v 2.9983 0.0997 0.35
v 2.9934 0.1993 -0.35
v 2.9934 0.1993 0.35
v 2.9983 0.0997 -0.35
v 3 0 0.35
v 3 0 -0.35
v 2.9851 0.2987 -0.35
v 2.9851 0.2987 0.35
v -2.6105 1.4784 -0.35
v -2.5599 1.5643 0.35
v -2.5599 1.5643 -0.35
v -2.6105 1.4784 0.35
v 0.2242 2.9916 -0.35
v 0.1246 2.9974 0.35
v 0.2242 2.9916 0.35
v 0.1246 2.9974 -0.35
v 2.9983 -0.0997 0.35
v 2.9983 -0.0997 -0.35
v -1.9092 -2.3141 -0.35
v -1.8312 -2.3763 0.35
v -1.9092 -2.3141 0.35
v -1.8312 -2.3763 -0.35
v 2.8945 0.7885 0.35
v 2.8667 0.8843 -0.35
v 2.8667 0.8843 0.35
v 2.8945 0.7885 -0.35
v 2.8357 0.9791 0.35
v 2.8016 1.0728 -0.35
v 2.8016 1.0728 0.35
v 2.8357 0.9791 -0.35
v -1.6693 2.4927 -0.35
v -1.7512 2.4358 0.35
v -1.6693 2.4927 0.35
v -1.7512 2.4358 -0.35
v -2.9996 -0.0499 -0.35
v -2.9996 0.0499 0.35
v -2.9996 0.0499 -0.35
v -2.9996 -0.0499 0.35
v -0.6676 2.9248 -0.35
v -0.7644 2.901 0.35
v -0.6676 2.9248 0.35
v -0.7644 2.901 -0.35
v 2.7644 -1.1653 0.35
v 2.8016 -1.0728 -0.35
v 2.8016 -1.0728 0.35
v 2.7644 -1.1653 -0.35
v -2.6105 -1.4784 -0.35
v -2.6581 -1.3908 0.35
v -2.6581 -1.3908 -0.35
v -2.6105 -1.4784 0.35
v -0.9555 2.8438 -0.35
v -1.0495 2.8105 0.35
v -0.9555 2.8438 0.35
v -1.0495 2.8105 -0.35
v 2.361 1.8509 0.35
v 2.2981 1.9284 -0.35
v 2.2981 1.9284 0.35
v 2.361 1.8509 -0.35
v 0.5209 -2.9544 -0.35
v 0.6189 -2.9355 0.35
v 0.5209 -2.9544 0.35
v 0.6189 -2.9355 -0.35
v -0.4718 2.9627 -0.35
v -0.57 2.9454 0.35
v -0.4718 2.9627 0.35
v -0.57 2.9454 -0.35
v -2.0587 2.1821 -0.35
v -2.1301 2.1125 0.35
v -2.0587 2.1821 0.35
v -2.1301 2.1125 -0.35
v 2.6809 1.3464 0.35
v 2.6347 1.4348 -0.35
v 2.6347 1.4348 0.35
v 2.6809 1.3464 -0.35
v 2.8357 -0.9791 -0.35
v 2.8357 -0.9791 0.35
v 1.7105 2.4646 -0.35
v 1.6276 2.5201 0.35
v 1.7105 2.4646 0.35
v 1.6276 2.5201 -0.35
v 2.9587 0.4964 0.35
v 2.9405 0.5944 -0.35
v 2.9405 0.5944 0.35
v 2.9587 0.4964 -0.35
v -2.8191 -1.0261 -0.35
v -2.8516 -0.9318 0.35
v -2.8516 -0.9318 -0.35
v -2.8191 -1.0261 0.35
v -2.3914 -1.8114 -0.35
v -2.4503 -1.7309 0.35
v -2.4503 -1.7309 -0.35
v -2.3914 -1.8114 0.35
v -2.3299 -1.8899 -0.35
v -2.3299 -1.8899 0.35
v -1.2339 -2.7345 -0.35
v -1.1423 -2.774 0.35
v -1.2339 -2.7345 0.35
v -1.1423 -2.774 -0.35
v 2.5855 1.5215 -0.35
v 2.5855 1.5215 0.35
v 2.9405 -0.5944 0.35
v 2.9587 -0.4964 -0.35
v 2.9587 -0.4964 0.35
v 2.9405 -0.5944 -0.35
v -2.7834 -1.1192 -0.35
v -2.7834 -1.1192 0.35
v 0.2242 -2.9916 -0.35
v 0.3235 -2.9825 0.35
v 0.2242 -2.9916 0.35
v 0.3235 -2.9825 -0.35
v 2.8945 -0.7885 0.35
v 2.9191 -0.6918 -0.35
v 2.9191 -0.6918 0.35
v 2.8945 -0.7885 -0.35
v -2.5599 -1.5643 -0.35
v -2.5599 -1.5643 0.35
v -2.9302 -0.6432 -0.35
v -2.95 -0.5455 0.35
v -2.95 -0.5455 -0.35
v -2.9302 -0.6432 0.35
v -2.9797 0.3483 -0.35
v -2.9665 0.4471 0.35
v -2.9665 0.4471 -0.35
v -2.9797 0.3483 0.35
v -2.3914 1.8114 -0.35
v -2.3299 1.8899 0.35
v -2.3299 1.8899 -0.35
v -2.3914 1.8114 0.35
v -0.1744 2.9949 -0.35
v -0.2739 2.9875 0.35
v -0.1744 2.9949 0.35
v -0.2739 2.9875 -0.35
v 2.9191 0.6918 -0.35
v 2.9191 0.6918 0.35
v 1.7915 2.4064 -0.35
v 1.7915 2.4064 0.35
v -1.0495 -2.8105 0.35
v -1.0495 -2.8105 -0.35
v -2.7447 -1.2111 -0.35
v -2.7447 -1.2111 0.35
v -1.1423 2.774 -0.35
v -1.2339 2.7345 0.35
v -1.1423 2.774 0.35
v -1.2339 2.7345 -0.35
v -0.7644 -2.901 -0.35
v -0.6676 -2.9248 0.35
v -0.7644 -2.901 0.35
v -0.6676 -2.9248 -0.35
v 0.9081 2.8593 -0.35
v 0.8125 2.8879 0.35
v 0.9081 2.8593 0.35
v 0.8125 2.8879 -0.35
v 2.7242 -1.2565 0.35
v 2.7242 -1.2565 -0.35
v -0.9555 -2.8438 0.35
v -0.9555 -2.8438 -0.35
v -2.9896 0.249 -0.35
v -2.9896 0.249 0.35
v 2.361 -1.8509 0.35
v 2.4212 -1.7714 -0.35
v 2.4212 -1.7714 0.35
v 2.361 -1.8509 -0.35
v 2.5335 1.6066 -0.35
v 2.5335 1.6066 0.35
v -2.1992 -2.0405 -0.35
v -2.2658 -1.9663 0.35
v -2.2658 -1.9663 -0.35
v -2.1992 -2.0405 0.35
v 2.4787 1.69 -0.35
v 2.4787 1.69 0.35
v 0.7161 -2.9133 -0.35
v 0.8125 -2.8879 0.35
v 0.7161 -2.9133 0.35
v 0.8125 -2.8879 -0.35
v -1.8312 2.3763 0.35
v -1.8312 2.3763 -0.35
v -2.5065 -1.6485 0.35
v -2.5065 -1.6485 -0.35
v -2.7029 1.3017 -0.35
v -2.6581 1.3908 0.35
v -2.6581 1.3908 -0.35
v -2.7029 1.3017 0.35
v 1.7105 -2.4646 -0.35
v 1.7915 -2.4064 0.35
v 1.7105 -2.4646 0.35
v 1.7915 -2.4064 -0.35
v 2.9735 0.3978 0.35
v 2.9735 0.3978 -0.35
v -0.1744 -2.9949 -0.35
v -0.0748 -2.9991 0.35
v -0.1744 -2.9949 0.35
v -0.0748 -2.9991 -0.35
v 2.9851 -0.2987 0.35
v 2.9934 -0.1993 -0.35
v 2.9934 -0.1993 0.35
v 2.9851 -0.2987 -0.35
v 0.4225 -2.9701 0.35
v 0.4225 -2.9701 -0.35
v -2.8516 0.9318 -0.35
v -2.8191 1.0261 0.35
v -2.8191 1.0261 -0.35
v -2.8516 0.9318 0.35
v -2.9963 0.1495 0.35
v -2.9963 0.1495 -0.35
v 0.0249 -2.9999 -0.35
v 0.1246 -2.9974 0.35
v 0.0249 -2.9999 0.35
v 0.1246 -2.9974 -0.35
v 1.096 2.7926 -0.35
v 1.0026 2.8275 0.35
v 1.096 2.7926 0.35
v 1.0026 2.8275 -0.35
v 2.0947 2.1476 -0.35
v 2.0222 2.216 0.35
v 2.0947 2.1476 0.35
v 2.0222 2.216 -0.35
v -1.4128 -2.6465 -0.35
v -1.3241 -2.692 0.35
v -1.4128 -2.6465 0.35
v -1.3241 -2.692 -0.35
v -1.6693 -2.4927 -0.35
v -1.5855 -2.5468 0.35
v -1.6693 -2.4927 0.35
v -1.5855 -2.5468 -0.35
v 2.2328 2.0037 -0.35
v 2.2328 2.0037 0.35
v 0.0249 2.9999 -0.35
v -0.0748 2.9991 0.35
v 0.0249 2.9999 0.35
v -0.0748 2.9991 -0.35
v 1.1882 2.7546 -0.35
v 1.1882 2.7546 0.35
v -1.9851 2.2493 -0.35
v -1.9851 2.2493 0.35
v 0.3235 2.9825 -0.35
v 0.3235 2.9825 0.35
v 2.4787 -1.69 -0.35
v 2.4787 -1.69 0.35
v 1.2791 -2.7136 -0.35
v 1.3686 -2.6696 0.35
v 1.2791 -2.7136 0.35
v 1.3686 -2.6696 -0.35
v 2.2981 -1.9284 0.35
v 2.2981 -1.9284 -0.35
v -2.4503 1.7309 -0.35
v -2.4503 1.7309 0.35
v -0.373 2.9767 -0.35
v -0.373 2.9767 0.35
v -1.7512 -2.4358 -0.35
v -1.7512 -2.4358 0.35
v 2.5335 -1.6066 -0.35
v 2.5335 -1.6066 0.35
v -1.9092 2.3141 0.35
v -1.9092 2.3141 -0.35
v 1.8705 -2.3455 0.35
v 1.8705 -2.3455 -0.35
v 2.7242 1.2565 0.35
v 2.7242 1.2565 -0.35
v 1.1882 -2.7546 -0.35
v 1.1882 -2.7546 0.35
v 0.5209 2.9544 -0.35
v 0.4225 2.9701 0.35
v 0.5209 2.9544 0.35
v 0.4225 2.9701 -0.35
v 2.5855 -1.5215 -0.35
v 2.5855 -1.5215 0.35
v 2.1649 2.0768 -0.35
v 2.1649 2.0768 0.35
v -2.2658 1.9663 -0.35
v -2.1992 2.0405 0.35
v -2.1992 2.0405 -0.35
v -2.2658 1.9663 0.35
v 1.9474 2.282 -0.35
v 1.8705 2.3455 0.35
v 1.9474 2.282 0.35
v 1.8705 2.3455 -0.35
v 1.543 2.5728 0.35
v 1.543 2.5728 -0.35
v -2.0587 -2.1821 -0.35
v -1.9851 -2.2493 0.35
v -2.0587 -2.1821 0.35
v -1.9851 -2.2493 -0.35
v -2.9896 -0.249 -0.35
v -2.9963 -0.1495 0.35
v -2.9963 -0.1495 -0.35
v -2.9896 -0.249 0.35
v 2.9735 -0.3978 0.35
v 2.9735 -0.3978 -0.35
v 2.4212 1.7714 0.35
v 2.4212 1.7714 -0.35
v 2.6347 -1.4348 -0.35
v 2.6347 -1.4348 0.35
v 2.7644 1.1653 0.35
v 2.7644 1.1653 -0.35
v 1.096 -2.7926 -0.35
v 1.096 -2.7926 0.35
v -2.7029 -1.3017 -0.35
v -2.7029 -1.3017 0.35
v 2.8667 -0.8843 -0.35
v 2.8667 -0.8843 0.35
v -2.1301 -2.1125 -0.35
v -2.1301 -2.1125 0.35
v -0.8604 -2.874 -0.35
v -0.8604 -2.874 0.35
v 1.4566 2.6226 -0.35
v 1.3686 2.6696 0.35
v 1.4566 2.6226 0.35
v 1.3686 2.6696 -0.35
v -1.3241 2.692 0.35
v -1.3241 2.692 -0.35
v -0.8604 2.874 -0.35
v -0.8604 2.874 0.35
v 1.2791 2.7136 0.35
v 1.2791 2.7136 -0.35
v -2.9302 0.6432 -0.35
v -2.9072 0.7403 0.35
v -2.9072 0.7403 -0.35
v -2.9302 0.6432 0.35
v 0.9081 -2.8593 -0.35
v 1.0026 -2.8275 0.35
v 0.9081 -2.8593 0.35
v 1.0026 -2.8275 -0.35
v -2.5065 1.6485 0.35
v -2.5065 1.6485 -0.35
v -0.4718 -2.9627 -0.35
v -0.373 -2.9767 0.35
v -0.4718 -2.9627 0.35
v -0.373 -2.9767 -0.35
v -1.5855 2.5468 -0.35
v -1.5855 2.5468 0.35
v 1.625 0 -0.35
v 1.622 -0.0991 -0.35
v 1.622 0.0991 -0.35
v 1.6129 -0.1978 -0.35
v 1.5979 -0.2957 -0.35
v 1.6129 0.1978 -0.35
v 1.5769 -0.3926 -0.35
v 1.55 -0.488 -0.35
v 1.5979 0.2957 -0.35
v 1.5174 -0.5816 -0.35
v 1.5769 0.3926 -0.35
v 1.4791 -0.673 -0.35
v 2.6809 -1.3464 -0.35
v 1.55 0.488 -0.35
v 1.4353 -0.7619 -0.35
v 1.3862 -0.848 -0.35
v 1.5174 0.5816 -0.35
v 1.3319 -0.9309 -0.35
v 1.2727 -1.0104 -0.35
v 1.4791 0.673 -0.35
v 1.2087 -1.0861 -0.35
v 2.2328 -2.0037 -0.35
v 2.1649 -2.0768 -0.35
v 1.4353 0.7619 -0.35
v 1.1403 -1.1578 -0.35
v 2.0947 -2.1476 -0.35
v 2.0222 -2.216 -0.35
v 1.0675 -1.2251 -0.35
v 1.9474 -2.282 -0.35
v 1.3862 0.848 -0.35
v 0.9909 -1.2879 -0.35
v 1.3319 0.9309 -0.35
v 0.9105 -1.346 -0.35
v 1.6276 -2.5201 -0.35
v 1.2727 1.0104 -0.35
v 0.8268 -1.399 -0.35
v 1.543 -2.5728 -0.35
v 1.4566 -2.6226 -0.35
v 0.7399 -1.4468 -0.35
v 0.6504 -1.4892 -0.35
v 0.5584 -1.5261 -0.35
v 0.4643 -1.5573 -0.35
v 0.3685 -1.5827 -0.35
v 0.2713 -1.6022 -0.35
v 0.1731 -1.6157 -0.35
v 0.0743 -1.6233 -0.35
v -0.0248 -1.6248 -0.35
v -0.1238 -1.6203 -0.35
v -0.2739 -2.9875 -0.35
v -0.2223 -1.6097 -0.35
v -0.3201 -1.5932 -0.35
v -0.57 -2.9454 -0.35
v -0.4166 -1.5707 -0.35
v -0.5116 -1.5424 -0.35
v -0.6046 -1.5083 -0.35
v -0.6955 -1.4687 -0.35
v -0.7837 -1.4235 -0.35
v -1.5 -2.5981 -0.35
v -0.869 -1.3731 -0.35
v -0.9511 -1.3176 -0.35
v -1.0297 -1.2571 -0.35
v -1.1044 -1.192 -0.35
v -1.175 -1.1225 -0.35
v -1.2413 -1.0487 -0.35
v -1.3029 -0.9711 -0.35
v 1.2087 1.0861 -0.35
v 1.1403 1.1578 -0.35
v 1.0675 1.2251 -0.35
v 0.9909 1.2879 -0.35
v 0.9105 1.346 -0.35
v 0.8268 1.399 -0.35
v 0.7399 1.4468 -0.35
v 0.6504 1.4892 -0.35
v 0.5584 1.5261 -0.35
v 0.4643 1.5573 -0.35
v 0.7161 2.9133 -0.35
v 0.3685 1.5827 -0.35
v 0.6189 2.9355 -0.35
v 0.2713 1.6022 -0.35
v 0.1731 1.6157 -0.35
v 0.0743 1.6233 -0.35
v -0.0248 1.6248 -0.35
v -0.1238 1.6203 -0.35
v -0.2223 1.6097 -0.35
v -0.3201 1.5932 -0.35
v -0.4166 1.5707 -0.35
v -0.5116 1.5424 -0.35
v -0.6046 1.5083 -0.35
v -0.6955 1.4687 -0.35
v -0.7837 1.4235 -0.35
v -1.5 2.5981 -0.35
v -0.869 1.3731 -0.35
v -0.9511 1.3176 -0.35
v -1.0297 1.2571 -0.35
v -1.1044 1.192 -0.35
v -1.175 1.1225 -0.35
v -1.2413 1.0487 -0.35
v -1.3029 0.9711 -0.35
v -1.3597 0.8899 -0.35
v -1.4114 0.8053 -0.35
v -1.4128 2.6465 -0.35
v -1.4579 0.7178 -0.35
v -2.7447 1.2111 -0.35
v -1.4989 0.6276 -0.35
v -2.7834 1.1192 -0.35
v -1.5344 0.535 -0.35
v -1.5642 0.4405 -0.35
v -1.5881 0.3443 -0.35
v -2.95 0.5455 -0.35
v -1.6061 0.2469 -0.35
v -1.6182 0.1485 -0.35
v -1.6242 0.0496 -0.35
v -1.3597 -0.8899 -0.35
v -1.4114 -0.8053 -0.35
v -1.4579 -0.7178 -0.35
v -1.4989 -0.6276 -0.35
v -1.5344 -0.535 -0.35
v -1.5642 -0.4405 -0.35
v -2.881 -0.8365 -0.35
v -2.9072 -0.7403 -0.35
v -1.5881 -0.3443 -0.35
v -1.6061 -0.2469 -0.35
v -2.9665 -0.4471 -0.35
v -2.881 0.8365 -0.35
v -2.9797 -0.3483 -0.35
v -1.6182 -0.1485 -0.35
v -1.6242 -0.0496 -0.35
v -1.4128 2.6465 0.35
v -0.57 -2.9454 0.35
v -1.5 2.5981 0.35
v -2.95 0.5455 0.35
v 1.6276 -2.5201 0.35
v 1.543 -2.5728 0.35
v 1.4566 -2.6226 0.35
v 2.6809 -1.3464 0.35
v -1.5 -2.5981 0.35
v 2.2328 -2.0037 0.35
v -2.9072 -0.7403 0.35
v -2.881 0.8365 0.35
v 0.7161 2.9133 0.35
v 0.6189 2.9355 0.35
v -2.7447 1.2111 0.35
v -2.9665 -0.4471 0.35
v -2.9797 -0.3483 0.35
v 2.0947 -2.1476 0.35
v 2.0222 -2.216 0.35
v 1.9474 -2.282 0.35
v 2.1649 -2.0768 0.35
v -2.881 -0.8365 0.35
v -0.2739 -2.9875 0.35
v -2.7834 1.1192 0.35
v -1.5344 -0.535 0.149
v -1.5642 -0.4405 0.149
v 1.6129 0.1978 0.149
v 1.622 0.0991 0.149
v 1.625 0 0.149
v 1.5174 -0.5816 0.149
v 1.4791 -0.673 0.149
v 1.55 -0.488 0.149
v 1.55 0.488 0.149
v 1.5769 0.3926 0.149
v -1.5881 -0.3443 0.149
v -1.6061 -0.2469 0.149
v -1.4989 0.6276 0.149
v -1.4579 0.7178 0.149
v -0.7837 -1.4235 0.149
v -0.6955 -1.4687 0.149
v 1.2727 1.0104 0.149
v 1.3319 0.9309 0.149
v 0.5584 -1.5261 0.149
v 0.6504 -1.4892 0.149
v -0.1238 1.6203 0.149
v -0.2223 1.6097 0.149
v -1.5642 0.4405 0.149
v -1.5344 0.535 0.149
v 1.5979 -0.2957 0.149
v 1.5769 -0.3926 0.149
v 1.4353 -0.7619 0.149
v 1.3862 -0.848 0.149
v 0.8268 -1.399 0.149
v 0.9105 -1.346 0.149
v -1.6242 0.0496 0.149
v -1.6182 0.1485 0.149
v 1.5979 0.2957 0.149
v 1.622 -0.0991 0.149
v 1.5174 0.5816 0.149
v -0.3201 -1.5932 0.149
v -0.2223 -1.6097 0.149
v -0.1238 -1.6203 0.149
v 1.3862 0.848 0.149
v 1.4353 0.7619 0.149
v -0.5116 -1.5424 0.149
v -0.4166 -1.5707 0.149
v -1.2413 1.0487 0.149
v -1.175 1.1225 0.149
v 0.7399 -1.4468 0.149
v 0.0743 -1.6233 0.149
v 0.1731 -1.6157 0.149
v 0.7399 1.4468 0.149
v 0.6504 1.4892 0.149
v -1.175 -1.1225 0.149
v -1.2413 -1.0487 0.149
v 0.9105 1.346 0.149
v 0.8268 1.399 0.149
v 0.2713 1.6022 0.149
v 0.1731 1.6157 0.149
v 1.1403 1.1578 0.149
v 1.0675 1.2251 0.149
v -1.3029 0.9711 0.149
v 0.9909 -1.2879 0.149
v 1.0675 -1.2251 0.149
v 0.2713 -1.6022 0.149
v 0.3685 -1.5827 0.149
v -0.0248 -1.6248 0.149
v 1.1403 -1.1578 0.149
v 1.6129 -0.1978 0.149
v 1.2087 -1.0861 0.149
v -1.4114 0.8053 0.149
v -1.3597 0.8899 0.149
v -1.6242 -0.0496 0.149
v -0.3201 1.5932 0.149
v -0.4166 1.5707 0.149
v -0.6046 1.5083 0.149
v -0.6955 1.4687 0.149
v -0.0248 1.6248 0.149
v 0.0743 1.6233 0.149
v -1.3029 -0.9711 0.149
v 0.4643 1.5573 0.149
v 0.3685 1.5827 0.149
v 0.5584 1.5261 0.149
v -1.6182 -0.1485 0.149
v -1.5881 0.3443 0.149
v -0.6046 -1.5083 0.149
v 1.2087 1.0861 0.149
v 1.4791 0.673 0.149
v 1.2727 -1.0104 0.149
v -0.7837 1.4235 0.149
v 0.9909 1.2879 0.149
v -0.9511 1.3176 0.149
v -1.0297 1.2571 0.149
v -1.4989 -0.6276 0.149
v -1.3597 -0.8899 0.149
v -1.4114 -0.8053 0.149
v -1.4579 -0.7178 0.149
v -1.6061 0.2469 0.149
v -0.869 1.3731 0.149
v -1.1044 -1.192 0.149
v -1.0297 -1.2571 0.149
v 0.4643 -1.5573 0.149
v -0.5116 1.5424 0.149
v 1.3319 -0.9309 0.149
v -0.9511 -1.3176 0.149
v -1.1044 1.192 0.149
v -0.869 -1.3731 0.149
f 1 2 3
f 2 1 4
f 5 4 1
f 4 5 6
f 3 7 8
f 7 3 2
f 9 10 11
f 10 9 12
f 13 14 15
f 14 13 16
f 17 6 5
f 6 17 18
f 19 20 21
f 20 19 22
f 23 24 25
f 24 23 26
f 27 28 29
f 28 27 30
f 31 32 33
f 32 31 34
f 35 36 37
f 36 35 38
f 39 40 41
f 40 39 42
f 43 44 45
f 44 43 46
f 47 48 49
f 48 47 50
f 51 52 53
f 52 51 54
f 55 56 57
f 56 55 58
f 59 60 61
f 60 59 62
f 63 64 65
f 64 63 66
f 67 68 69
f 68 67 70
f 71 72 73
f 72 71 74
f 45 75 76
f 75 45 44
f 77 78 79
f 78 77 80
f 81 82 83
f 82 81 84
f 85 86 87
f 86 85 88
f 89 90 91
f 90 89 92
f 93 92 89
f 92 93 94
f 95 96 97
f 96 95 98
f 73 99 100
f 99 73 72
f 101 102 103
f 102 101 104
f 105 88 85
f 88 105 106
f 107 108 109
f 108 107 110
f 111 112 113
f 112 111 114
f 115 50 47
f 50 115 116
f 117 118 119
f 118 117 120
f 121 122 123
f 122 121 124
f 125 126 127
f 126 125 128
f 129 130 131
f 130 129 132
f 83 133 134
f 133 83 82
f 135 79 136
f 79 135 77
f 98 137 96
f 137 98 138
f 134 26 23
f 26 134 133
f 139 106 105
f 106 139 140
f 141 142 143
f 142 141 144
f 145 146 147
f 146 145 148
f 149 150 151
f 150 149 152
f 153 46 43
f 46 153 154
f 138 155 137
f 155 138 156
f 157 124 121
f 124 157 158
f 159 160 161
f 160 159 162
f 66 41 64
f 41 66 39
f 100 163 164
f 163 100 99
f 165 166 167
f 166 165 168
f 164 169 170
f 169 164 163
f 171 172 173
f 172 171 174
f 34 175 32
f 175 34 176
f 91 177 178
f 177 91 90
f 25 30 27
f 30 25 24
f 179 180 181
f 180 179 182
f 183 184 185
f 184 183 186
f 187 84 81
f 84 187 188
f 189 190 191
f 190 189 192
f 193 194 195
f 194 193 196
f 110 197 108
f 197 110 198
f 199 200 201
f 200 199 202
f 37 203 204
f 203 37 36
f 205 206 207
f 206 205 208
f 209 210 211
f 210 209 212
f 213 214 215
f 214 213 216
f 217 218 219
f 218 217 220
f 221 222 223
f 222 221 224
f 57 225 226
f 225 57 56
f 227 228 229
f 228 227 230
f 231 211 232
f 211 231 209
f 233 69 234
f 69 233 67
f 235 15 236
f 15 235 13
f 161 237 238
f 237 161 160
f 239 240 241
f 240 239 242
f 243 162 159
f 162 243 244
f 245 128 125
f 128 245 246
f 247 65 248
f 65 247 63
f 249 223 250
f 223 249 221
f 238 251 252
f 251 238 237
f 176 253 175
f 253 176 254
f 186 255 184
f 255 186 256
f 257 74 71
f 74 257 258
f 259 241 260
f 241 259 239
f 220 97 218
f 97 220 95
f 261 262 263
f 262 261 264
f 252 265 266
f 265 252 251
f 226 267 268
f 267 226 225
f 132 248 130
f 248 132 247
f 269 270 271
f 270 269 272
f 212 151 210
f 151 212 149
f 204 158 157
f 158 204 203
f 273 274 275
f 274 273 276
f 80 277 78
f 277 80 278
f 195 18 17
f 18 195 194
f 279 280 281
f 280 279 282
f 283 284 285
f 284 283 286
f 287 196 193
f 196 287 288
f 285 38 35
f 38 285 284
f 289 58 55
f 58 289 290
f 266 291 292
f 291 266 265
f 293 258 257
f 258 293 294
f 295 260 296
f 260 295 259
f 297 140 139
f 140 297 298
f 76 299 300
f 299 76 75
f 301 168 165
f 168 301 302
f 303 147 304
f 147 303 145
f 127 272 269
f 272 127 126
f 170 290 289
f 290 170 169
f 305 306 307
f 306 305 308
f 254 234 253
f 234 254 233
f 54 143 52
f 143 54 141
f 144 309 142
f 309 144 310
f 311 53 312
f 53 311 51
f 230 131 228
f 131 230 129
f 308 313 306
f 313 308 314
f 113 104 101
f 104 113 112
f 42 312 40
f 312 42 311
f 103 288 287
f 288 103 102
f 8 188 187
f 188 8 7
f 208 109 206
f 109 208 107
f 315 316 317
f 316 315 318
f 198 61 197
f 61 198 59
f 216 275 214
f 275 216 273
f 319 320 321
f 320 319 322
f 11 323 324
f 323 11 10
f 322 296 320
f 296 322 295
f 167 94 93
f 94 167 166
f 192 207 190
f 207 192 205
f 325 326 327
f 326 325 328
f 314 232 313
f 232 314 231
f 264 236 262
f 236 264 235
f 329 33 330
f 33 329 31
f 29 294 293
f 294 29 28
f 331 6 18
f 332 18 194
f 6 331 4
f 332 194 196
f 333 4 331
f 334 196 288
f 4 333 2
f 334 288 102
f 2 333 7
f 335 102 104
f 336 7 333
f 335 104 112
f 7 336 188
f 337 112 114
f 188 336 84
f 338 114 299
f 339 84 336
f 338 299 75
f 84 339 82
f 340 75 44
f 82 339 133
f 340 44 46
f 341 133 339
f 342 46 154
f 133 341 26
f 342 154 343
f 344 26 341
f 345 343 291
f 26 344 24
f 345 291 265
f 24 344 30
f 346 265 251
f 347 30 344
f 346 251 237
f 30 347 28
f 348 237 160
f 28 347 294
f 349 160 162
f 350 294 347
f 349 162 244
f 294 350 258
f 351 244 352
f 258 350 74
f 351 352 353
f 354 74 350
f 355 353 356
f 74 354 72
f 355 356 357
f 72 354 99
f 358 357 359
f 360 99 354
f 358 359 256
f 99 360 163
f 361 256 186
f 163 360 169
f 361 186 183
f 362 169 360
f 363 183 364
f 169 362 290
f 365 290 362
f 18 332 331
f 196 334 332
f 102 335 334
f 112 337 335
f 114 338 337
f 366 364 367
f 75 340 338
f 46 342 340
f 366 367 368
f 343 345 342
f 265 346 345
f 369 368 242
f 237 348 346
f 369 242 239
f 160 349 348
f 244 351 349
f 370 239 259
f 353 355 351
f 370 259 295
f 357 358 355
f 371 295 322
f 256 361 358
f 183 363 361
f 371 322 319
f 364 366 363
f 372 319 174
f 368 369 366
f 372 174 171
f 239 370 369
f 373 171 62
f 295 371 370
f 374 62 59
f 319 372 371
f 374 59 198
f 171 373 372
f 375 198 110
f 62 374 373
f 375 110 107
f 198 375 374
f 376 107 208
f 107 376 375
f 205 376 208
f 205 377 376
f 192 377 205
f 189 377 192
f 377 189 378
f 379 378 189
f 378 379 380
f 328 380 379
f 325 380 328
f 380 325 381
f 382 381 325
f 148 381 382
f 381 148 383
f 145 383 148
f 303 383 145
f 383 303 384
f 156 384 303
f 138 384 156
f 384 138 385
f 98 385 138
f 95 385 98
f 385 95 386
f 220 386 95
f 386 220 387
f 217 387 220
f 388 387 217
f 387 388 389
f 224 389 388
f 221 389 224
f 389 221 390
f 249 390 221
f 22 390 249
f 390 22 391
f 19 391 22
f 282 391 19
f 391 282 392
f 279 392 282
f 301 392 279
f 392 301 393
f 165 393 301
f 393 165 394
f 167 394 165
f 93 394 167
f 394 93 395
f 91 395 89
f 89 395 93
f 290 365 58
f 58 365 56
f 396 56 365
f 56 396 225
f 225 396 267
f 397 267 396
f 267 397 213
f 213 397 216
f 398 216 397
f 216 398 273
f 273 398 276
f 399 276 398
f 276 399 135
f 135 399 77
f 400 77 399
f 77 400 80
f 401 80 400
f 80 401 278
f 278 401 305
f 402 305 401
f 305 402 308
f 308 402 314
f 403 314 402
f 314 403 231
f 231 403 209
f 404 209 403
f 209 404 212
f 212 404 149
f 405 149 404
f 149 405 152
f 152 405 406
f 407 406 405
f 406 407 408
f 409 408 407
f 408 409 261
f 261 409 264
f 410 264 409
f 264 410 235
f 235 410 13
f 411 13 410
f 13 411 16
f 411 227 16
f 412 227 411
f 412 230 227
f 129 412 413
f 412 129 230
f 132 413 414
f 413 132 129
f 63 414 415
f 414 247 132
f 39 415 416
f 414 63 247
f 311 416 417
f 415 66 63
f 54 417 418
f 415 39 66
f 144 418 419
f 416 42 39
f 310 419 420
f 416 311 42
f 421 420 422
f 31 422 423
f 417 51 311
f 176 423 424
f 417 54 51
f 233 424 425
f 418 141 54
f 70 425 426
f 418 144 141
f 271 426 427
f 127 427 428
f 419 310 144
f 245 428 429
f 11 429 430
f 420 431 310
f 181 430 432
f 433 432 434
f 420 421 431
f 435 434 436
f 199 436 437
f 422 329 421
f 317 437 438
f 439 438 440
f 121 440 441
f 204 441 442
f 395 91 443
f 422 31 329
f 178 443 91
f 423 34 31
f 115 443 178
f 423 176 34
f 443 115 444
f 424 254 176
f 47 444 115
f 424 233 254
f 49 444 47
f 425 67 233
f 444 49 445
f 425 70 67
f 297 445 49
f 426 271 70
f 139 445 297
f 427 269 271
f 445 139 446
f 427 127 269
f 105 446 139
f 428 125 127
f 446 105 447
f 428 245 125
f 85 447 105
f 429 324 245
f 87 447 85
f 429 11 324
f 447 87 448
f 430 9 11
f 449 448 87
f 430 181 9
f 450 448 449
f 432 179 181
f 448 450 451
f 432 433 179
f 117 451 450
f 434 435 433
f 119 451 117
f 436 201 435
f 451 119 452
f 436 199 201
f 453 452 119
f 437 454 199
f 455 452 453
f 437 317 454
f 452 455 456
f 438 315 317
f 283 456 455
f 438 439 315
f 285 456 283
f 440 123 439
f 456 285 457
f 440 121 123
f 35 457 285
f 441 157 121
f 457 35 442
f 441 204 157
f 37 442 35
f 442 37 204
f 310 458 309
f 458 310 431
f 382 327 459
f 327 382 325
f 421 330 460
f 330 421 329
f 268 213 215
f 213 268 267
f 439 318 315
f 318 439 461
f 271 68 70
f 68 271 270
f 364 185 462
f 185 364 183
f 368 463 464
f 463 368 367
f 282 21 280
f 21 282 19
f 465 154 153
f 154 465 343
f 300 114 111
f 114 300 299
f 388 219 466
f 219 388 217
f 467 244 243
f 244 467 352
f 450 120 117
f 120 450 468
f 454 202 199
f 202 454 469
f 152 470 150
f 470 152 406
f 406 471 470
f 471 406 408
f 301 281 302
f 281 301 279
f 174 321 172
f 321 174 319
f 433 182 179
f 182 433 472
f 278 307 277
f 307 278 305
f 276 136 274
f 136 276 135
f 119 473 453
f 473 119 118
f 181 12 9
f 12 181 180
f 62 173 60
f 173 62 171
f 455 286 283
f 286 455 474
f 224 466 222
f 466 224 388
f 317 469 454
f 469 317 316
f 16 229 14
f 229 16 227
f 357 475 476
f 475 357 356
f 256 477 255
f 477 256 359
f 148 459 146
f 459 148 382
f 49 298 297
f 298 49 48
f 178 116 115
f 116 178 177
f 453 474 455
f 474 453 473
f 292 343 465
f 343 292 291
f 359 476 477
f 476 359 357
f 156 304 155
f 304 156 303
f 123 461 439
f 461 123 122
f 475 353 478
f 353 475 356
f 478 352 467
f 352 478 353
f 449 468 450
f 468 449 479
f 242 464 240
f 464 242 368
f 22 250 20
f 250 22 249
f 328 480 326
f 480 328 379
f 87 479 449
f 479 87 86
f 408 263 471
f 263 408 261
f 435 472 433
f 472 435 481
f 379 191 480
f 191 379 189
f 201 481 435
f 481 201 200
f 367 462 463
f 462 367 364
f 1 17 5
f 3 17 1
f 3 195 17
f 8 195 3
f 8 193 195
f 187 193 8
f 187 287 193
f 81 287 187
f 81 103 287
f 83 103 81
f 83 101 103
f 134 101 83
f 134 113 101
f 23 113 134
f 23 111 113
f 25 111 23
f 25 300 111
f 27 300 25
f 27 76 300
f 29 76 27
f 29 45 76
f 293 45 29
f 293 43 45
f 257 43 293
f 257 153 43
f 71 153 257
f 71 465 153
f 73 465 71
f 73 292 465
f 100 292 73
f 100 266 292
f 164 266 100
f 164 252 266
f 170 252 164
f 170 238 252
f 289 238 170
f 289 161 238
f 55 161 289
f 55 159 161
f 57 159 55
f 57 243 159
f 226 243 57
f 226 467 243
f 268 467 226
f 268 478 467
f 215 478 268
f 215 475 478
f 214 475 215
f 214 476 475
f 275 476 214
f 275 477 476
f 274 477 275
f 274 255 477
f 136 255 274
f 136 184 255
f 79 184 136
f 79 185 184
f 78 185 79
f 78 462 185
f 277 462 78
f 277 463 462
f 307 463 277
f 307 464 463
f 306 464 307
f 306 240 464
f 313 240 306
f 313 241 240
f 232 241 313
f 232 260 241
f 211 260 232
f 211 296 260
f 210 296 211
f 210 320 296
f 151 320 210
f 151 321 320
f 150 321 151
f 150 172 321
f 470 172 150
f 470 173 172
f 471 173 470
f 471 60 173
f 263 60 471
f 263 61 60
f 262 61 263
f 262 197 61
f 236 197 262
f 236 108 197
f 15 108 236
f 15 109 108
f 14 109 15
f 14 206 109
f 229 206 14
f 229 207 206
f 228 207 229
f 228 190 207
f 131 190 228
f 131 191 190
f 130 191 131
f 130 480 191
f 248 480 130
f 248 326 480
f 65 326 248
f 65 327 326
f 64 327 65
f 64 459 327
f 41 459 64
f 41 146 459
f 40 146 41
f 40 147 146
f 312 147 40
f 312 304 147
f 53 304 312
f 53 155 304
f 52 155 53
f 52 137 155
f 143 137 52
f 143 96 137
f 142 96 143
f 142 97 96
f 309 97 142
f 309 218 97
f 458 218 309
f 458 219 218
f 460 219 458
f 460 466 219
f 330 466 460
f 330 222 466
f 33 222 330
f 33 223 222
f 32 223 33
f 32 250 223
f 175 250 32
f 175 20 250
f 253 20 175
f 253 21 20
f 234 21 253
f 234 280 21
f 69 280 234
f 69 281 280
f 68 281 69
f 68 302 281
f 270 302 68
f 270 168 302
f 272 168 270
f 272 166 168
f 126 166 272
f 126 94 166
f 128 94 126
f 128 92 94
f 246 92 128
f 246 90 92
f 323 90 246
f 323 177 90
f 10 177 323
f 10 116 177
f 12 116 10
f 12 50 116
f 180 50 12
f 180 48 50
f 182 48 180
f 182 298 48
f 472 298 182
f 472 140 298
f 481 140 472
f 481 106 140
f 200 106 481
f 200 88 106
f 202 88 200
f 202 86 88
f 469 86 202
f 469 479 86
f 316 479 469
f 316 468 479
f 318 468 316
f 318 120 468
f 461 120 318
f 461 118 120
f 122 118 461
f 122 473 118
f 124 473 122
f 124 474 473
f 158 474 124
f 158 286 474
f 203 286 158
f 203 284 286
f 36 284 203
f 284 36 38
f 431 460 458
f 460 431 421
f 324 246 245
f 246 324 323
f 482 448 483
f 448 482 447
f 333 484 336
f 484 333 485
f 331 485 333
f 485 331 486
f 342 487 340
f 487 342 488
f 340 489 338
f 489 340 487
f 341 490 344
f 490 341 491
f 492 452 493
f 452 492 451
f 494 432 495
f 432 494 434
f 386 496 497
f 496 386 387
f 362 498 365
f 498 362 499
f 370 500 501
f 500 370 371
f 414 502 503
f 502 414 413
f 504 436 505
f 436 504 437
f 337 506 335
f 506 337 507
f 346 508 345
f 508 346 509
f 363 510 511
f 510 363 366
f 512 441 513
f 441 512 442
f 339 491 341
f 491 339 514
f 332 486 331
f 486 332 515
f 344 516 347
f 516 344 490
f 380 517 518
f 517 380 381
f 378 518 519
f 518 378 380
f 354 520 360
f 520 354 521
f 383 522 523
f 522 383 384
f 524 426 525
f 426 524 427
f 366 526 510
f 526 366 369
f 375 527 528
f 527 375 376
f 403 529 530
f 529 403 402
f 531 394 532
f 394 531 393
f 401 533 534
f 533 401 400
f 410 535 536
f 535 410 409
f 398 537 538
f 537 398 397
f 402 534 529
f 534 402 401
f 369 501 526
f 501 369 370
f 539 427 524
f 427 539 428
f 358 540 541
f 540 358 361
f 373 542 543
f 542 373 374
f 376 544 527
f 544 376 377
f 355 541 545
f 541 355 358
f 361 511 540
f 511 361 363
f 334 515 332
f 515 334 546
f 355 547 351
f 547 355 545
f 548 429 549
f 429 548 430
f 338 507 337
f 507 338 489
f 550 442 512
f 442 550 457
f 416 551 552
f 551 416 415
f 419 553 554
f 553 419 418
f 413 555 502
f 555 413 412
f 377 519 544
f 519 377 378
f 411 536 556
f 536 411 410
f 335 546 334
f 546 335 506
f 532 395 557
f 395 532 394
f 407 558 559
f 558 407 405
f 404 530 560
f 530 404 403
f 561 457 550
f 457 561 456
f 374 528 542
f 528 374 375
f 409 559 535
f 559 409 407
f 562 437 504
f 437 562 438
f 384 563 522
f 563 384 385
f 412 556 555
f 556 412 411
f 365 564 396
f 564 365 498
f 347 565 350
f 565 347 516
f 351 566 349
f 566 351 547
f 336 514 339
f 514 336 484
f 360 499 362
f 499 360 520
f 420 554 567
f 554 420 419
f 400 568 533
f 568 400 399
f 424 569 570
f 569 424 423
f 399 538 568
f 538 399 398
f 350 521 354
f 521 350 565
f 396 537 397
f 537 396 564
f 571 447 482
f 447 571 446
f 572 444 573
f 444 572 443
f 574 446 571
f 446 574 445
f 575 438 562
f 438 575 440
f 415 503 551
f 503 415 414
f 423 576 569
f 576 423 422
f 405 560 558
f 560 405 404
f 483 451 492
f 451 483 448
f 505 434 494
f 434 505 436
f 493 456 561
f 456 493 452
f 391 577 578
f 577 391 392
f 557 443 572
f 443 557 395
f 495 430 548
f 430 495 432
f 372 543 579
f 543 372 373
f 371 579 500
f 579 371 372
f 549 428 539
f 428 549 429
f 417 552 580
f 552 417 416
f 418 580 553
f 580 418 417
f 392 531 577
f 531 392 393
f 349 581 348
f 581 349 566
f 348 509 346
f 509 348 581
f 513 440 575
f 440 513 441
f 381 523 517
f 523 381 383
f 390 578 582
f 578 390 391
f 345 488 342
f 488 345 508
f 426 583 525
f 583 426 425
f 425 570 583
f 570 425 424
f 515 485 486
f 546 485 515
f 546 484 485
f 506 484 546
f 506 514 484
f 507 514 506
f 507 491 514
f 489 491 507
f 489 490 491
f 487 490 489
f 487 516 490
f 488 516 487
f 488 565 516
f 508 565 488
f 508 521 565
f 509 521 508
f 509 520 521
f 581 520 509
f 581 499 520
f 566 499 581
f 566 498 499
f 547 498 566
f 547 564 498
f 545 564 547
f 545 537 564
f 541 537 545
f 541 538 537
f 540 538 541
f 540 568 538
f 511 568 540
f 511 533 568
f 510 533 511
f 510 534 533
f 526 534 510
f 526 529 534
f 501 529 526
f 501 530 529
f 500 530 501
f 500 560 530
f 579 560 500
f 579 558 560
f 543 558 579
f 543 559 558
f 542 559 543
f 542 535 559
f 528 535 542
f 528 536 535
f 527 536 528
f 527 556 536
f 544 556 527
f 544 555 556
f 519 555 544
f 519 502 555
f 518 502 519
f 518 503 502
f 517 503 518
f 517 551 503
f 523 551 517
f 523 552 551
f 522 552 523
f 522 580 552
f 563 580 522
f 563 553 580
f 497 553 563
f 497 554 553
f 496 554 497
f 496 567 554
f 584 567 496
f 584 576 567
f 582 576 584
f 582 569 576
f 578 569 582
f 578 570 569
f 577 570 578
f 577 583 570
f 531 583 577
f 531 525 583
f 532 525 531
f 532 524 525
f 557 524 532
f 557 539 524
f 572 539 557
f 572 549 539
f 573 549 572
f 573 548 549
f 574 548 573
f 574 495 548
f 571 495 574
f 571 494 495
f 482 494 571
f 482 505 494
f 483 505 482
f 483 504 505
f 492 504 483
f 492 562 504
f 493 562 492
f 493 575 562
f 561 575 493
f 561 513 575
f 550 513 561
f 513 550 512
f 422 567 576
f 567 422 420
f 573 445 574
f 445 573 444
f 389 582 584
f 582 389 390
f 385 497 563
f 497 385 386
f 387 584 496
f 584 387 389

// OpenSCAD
$fa = 0.1;
$fs = 0.1;


KEYCAP_HEIGHT=0.7;
KEYCAP_UPPER_THICKNESS=0.2;
KEYCAP_INNER_HEIGHT=KEYCAP_HEIGHT-KEYCAP_UPPER_THICKNESS;
KEYCAP_DIAM=6.0;
KEYCAP_INNER_DIAM=3.25;

difference(){
    cylinder(h=KEYCAP_HEIGHT,r=KEYCAP_DIAM/2, center=true);
    translate([0,0,(-(KEYCAP_HEIGHT-KEYCAP_INNER_HEIGHT)/2)-0.001])
    cylinder(h=KEYCAP_INNER_HEIGHT, r=KEYCAP_INNER_DIAM/2, center=true);
}
